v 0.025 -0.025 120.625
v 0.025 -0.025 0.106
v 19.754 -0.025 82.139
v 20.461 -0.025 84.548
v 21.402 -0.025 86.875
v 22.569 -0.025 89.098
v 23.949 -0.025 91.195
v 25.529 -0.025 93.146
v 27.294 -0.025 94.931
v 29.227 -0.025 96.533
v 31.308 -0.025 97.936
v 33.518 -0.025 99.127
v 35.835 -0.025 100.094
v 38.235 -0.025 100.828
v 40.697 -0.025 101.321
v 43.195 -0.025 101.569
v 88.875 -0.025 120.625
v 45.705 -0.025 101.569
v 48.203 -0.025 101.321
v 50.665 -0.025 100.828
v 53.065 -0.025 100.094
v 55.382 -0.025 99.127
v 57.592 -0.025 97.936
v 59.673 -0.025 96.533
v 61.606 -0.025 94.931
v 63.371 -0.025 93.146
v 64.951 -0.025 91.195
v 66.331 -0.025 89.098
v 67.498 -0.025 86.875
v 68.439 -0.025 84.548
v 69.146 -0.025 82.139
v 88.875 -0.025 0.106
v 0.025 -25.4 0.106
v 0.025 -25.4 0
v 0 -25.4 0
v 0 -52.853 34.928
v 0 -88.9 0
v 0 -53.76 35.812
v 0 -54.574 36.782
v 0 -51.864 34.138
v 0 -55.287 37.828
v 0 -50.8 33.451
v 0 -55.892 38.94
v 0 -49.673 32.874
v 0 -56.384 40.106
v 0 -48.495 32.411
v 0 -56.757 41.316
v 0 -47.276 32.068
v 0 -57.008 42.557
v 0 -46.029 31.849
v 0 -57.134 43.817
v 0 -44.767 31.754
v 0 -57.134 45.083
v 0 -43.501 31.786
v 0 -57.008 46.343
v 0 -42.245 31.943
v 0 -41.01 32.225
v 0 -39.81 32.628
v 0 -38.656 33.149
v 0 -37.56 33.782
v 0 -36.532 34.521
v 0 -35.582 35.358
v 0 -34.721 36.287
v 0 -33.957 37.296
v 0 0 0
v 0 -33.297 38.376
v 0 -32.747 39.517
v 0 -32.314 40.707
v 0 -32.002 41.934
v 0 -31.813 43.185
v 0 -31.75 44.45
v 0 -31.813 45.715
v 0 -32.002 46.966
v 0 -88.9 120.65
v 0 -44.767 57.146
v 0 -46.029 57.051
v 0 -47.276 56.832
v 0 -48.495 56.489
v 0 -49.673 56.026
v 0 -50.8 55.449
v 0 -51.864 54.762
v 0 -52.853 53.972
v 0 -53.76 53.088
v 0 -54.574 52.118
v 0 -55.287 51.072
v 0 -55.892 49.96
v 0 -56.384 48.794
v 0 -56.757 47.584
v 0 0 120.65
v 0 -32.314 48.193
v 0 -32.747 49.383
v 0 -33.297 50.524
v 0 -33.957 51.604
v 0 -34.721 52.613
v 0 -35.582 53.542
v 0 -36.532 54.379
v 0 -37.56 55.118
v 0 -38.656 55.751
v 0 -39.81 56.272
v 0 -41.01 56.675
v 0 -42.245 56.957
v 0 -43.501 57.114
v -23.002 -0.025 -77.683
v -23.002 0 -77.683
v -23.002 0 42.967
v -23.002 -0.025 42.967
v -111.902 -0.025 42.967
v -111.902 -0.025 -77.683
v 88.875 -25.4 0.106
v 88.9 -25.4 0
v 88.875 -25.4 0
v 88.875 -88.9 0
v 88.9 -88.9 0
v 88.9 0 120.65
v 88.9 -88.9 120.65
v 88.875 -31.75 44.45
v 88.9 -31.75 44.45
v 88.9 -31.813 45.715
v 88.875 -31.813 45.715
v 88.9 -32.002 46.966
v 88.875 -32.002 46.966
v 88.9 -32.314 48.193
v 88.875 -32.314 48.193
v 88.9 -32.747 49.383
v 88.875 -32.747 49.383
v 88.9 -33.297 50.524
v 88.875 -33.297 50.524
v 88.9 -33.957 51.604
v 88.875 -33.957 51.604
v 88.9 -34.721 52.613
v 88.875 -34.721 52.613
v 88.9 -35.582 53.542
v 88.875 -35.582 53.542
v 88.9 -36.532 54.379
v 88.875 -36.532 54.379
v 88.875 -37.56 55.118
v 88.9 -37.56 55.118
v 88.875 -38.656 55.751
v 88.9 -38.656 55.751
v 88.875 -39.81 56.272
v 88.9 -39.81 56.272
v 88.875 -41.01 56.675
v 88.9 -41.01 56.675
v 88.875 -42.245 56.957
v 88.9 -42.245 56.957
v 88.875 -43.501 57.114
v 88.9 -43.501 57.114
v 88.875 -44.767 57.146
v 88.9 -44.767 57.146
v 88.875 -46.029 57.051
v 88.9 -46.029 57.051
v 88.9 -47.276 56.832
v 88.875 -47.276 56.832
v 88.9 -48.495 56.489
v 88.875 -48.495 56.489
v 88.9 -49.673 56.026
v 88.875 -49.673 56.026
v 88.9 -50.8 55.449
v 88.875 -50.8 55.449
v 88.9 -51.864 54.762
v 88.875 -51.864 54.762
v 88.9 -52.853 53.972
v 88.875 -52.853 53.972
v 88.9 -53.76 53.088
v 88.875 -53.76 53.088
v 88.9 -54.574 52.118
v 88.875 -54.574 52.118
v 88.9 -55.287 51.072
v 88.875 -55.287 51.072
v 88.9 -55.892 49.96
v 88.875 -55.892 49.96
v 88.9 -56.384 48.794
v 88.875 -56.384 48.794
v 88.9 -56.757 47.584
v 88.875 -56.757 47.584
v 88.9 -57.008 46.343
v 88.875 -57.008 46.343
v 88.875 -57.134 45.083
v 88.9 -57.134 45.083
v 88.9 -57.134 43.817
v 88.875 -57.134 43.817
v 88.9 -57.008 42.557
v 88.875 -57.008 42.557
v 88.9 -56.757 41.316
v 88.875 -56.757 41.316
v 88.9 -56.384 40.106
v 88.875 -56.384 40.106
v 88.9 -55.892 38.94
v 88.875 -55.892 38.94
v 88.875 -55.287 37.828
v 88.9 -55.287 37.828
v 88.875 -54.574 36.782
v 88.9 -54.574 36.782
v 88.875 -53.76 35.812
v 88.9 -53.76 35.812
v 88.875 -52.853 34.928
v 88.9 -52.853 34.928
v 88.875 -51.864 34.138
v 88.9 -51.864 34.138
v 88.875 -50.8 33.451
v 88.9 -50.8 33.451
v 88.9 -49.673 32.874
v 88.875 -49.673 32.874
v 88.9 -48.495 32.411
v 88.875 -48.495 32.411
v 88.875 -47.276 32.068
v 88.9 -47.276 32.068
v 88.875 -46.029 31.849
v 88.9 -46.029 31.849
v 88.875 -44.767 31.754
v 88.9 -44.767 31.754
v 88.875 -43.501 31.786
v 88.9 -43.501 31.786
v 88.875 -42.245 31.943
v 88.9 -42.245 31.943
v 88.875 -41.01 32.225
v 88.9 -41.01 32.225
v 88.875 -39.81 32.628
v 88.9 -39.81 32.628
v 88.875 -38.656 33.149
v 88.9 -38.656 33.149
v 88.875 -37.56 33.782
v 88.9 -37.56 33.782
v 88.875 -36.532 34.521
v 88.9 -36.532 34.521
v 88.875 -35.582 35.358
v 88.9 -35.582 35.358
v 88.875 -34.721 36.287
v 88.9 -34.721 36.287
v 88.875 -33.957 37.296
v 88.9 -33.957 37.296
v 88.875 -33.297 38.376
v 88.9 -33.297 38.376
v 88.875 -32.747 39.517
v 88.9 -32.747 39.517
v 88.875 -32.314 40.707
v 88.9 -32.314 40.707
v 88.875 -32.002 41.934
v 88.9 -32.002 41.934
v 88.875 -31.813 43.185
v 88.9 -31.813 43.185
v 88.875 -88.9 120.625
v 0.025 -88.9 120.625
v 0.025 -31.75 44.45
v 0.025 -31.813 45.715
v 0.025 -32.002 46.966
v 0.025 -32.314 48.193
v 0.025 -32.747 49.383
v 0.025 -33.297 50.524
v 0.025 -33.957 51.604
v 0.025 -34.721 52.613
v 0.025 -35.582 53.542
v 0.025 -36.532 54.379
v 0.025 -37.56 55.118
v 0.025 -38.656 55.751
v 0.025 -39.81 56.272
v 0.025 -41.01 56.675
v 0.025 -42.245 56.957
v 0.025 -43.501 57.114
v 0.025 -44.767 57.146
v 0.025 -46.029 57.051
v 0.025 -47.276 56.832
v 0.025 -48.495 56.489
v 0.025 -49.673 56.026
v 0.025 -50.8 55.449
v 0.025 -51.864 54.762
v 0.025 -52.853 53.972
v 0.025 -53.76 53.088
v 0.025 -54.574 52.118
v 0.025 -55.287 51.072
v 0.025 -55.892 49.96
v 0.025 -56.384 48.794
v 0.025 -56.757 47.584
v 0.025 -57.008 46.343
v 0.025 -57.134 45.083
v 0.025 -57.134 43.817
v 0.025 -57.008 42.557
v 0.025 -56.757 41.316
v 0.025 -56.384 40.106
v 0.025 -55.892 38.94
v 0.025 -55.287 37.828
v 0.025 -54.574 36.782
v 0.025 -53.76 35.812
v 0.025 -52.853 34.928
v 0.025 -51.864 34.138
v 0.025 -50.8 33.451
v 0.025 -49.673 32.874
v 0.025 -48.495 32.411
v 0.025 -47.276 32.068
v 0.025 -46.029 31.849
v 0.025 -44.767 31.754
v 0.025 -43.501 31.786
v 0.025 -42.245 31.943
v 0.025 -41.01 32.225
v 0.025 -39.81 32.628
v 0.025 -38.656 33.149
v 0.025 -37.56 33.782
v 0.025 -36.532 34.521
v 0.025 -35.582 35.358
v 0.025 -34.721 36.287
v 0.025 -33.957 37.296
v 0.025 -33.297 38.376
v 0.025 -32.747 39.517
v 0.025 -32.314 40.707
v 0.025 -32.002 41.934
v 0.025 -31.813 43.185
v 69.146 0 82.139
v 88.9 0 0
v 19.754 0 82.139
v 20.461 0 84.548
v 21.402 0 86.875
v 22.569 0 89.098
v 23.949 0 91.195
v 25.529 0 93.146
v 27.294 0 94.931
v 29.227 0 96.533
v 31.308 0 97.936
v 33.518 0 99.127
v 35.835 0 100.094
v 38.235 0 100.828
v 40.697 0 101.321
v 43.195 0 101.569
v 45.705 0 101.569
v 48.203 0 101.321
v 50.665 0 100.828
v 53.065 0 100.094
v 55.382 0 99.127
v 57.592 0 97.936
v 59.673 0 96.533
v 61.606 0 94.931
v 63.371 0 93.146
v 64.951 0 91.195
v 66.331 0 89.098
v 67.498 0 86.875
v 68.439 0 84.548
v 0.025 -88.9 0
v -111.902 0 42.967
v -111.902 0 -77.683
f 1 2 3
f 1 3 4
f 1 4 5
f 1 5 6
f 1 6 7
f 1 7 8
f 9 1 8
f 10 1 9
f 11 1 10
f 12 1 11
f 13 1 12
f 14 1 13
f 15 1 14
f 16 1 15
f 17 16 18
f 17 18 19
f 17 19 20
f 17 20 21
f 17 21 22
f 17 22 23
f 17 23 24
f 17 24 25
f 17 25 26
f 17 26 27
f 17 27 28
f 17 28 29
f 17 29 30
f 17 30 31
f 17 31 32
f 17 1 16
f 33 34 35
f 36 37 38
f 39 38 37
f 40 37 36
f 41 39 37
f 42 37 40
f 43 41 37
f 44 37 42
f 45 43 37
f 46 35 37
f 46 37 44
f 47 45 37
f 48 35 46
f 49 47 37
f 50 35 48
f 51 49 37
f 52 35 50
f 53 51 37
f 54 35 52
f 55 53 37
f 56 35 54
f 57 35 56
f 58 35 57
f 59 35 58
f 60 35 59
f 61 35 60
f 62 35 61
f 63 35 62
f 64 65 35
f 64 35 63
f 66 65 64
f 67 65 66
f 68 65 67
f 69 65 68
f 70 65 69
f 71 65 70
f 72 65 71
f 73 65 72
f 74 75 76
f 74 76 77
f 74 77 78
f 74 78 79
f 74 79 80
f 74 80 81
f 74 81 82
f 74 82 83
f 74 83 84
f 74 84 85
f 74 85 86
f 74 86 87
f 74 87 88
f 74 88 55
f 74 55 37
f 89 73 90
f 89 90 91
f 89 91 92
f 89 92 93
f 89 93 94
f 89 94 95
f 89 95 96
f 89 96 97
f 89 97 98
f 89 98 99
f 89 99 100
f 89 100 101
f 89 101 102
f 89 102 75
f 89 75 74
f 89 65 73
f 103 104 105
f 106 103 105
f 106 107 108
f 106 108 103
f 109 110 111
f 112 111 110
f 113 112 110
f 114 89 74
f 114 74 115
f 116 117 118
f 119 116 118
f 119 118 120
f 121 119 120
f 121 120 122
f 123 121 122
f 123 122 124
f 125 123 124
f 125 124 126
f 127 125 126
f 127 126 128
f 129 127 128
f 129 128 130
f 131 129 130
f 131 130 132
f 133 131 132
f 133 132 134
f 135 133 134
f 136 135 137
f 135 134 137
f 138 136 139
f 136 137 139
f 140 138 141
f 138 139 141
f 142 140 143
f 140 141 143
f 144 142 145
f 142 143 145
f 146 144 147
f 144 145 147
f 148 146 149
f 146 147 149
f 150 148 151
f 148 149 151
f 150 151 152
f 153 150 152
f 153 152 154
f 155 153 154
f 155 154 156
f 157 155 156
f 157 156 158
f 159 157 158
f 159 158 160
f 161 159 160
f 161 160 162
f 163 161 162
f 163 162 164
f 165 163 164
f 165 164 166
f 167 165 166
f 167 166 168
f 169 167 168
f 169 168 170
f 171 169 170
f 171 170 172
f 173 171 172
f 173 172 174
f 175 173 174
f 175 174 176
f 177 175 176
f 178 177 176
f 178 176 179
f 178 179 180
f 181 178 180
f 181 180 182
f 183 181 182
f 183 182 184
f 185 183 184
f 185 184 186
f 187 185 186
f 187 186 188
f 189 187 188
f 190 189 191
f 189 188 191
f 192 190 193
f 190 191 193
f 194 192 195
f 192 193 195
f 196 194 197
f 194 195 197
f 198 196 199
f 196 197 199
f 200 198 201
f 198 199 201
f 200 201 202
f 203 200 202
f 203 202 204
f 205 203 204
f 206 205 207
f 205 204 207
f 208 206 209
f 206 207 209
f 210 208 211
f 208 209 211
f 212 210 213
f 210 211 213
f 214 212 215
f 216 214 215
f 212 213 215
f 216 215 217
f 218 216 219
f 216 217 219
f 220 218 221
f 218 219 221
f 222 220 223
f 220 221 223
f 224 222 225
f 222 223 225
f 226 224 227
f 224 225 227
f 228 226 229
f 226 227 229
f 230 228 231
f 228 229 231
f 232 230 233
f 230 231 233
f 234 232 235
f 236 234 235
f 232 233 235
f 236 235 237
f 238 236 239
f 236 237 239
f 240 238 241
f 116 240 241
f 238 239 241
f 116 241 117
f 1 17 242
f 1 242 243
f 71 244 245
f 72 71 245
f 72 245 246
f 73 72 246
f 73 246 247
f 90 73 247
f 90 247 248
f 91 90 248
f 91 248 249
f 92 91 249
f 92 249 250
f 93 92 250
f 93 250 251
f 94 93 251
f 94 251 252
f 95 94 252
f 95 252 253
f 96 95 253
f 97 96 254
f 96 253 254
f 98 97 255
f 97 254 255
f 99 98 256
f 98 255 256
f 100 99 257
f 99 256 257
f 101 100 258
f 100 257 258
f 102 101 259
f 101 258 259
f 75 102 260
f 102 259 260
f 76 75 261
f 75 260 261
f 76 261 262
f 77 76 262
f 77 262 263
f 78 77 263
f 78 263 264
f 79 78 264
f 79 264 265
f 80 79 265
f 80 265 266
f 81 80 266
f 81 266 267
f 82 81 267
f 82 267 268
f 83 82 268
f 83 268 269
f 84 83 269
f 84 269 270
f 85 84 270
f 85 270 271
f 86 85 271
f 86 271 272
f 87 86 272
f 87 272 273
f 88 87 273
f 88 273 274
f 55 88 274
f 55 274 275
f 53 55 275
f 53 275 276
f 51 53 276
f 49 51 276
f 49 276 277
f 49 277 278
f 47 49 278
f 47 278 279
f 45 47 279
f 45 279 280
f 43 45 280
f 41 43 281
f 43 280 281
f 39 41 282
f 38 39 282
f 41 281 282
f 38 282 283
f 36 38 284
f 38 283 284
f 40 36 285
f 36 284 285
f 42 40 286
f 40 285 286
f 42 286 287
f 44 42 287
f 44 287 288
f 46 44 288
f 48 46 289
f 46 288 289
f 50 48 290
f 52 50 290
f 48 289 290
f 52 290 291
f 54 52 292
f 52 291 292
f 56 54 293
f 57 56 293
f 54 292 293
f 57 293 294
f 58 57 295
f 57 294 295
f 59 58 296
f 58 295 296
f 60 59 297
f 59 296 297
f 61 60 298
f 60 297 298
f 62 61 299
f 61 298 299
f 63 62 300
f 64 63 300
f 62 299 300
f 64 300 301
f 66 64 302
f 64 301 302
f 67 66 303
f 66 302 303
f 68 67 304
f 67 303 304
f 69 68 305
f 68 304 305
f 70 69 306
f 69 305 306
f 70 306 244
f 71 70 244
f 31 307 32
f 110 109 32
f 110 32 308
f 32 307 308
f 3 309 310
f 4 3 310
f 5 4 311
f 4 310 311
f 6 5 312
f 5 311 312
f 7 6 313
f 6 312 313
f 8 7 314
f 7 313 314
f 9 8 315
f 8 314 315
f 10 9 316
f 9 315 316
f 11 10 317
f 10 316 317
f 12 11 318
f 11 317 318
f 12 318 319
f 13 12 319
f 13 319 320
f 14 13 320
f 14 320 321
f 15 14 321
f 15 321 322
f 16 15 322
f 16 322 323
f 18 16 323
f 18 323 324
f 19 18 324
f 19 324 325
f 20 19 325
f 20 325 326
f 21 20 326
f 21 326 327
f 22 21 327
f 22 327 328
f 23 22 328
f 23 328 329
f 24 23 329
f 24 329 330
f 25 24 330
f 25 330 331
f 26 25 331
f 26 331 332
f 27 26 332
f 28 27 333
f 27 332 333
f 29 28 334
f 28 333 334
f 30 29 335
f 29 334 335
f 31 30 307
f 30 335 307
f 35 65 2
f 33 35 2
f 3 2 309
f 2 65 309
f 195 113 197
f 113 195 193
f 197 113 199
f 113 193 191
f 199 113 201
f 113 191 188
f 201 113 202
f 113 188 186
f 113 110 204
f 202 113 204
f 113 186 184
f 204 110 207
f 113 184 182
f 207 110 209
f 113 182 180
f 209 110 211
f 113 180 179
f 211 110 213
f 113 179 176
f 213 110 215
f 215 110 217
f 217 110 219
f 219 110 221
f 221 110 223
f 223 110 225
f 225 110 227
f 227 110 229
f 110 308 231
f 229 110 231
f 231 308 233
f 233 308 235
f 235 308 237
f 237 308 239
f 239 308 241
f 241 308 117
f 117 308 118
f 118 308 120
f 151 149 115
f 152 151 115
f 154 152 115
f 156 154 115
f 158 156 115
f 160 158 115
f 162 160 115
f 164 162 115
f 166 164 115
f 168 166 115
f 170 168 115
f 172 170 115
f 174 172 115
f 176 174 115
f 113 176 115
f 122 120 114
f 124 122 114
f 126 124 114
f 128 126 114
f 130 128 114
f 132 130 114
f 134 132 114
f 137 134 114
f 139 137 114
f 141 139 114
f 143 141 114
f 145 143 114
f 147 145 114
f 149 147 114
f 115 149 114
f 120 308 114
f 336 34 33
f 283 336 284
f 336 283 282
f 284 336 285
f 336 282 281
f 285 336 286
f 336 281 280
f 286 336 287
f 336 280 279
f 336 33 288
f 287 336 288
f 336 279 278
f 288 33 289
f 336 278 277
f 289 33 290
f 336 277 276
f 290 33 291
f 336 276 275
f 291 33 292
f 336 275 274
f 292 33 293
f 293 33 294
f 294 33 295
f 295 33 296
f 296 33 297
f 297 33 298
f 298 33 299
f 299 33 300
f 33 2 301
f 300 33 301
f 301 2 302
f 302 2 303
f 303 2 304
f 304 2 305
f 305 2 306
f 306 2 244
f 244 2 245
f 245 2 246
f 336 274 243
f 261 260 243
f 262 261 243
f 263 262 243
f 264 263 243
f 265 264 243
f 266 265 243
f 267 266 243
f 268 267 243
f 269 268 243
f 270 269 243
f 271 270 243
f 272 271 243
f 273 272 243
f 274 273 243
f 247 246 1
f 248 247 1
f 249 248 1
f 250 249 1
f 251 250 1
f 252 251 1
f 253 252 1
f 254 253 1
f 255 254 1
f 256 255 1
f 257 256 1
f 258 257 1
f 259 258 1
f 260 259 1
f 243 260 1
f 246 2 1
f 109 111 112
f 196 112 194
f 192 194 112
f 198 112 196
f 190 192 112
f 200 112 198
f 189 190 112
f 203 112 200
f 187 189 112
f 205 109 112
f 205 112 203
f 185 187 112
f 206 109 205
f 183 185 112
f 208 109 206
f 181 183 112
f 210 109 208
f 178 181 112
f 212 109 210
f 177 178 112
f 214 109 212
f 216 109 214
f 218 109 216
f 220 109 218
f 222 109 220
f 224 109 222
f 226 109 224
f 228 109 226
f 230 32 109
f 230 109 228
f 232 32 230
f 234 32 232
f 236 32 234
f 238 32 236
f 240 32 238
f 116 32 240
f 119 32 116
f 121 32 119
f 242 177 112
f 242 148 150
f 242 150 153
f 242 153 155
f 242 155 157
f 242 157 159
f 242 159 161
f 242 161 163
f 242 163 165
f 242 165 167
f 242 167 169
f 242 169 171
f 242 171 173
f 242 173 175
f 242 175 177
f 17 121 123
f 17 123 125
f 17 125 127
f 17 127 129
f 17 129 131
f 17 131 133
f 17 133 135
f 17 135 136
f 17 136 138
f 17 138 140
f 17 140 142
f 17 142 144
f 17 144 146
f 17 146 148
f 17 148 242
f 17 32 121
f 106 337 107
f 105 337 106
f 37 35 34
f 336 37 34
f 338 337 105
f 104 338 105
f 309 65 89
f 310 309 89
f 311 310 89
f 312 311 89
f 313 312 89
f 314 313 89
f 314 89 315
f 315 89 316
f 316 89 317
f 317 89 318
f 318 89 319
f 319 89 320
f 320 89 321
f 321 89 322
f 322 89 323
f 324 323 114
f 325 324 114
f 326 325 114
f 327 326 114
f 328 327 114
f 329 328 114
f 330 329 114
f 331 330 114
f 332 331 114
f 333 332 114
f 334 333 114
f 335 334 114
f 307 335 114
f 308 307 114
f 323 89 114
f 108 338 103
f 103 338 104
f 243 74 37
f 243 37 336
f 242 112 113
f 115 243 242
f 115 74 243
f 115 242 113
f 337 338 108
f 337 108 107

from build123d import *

# Parameters (mm, degrees)
F0_W      = 88.9
F0_H      = 120.65
F1_DEPTH  = 88.9
F3_T      = -0.0254
F4_DEPTH  = 25.4
F5_R      = 12.7
F6_DEPTH  = 127
F7_W      = 88.8492
F7_H      = 120.6246
F8_DEPTH  = 12.7
F9_W      = 88.9
F9_H      = 120.65
F10_DEPTH = 0.0254


with BuildPart() as f1:
    # F0 (on Front) → F1 (new body)
    with BuildSketch(Plane.XZ):
        with Locations((44.45, 60.325)):
            Rectangle(F0_W, F0_H)
    extrude(amount=F1_DEPTH)

    # F3
    f3_openings = [f1.faces().sort_by_distance(p)[0] for p in [
        (44.45, -44.45, 0),
    ]]
    offset(amount=F3_T, openings=f3_openings)

    # F2 (on face) → F4 (cut)
    with BuildSketch(Plane(origin=(0, 0, 0), x_dir=(-1, 0, 0), z_dir=(0, 1, 0))):
        with BuildLine():
            Line((-88.9, 0), (0, 0))
            Line((0, 0), (-19.7541437553, 82.1392494761))
            ThreePointArc((-19.7541437553, 82.1392494761), (-44.45, 101.6), (-69.1458562447, 82.1392494761))
            Line((-69.1458562447, 82.1392494761), (-88.9, 0))
        make_face()
    extrude(amount=-F4_DEPTH, mode=Mode.SUBTRACT)

    # F5 (on face) → F6 (cut)
    with BuildSketch(Plane.YZ.offset(88.9)):
        with Locations((-44.45, 44.45)):
            Circle(F5_R)
    extrude(amount=-F6_DEPTH, mode=Mode.SUBTRACT)

    # F7 (on face) → F8 (cut)
    with BuildSketch(Plane(origin=(0, -88.8746, 0), x_dir=(-1, 0, 0), z_dir=(0, 1, 0))):
        with Locations((-44.45, 60.3123)):
            Rectangle(F7_W, F7_H)
    extrude(amount=-F8_DEPTH, mode=Mode.SUBTRACT)


with BuildPart() as f10:
    # F9 (on Front) → F10 (new body)
    with BuildSketch(Plane.XZ):
        with Locations((-67.4515275559, -17.3582615852)):
            Rectangle(F9_W, F9_H)
    extrude(amount=F10_DEPTH)


solid = Compound([f1.part, f10.part])
